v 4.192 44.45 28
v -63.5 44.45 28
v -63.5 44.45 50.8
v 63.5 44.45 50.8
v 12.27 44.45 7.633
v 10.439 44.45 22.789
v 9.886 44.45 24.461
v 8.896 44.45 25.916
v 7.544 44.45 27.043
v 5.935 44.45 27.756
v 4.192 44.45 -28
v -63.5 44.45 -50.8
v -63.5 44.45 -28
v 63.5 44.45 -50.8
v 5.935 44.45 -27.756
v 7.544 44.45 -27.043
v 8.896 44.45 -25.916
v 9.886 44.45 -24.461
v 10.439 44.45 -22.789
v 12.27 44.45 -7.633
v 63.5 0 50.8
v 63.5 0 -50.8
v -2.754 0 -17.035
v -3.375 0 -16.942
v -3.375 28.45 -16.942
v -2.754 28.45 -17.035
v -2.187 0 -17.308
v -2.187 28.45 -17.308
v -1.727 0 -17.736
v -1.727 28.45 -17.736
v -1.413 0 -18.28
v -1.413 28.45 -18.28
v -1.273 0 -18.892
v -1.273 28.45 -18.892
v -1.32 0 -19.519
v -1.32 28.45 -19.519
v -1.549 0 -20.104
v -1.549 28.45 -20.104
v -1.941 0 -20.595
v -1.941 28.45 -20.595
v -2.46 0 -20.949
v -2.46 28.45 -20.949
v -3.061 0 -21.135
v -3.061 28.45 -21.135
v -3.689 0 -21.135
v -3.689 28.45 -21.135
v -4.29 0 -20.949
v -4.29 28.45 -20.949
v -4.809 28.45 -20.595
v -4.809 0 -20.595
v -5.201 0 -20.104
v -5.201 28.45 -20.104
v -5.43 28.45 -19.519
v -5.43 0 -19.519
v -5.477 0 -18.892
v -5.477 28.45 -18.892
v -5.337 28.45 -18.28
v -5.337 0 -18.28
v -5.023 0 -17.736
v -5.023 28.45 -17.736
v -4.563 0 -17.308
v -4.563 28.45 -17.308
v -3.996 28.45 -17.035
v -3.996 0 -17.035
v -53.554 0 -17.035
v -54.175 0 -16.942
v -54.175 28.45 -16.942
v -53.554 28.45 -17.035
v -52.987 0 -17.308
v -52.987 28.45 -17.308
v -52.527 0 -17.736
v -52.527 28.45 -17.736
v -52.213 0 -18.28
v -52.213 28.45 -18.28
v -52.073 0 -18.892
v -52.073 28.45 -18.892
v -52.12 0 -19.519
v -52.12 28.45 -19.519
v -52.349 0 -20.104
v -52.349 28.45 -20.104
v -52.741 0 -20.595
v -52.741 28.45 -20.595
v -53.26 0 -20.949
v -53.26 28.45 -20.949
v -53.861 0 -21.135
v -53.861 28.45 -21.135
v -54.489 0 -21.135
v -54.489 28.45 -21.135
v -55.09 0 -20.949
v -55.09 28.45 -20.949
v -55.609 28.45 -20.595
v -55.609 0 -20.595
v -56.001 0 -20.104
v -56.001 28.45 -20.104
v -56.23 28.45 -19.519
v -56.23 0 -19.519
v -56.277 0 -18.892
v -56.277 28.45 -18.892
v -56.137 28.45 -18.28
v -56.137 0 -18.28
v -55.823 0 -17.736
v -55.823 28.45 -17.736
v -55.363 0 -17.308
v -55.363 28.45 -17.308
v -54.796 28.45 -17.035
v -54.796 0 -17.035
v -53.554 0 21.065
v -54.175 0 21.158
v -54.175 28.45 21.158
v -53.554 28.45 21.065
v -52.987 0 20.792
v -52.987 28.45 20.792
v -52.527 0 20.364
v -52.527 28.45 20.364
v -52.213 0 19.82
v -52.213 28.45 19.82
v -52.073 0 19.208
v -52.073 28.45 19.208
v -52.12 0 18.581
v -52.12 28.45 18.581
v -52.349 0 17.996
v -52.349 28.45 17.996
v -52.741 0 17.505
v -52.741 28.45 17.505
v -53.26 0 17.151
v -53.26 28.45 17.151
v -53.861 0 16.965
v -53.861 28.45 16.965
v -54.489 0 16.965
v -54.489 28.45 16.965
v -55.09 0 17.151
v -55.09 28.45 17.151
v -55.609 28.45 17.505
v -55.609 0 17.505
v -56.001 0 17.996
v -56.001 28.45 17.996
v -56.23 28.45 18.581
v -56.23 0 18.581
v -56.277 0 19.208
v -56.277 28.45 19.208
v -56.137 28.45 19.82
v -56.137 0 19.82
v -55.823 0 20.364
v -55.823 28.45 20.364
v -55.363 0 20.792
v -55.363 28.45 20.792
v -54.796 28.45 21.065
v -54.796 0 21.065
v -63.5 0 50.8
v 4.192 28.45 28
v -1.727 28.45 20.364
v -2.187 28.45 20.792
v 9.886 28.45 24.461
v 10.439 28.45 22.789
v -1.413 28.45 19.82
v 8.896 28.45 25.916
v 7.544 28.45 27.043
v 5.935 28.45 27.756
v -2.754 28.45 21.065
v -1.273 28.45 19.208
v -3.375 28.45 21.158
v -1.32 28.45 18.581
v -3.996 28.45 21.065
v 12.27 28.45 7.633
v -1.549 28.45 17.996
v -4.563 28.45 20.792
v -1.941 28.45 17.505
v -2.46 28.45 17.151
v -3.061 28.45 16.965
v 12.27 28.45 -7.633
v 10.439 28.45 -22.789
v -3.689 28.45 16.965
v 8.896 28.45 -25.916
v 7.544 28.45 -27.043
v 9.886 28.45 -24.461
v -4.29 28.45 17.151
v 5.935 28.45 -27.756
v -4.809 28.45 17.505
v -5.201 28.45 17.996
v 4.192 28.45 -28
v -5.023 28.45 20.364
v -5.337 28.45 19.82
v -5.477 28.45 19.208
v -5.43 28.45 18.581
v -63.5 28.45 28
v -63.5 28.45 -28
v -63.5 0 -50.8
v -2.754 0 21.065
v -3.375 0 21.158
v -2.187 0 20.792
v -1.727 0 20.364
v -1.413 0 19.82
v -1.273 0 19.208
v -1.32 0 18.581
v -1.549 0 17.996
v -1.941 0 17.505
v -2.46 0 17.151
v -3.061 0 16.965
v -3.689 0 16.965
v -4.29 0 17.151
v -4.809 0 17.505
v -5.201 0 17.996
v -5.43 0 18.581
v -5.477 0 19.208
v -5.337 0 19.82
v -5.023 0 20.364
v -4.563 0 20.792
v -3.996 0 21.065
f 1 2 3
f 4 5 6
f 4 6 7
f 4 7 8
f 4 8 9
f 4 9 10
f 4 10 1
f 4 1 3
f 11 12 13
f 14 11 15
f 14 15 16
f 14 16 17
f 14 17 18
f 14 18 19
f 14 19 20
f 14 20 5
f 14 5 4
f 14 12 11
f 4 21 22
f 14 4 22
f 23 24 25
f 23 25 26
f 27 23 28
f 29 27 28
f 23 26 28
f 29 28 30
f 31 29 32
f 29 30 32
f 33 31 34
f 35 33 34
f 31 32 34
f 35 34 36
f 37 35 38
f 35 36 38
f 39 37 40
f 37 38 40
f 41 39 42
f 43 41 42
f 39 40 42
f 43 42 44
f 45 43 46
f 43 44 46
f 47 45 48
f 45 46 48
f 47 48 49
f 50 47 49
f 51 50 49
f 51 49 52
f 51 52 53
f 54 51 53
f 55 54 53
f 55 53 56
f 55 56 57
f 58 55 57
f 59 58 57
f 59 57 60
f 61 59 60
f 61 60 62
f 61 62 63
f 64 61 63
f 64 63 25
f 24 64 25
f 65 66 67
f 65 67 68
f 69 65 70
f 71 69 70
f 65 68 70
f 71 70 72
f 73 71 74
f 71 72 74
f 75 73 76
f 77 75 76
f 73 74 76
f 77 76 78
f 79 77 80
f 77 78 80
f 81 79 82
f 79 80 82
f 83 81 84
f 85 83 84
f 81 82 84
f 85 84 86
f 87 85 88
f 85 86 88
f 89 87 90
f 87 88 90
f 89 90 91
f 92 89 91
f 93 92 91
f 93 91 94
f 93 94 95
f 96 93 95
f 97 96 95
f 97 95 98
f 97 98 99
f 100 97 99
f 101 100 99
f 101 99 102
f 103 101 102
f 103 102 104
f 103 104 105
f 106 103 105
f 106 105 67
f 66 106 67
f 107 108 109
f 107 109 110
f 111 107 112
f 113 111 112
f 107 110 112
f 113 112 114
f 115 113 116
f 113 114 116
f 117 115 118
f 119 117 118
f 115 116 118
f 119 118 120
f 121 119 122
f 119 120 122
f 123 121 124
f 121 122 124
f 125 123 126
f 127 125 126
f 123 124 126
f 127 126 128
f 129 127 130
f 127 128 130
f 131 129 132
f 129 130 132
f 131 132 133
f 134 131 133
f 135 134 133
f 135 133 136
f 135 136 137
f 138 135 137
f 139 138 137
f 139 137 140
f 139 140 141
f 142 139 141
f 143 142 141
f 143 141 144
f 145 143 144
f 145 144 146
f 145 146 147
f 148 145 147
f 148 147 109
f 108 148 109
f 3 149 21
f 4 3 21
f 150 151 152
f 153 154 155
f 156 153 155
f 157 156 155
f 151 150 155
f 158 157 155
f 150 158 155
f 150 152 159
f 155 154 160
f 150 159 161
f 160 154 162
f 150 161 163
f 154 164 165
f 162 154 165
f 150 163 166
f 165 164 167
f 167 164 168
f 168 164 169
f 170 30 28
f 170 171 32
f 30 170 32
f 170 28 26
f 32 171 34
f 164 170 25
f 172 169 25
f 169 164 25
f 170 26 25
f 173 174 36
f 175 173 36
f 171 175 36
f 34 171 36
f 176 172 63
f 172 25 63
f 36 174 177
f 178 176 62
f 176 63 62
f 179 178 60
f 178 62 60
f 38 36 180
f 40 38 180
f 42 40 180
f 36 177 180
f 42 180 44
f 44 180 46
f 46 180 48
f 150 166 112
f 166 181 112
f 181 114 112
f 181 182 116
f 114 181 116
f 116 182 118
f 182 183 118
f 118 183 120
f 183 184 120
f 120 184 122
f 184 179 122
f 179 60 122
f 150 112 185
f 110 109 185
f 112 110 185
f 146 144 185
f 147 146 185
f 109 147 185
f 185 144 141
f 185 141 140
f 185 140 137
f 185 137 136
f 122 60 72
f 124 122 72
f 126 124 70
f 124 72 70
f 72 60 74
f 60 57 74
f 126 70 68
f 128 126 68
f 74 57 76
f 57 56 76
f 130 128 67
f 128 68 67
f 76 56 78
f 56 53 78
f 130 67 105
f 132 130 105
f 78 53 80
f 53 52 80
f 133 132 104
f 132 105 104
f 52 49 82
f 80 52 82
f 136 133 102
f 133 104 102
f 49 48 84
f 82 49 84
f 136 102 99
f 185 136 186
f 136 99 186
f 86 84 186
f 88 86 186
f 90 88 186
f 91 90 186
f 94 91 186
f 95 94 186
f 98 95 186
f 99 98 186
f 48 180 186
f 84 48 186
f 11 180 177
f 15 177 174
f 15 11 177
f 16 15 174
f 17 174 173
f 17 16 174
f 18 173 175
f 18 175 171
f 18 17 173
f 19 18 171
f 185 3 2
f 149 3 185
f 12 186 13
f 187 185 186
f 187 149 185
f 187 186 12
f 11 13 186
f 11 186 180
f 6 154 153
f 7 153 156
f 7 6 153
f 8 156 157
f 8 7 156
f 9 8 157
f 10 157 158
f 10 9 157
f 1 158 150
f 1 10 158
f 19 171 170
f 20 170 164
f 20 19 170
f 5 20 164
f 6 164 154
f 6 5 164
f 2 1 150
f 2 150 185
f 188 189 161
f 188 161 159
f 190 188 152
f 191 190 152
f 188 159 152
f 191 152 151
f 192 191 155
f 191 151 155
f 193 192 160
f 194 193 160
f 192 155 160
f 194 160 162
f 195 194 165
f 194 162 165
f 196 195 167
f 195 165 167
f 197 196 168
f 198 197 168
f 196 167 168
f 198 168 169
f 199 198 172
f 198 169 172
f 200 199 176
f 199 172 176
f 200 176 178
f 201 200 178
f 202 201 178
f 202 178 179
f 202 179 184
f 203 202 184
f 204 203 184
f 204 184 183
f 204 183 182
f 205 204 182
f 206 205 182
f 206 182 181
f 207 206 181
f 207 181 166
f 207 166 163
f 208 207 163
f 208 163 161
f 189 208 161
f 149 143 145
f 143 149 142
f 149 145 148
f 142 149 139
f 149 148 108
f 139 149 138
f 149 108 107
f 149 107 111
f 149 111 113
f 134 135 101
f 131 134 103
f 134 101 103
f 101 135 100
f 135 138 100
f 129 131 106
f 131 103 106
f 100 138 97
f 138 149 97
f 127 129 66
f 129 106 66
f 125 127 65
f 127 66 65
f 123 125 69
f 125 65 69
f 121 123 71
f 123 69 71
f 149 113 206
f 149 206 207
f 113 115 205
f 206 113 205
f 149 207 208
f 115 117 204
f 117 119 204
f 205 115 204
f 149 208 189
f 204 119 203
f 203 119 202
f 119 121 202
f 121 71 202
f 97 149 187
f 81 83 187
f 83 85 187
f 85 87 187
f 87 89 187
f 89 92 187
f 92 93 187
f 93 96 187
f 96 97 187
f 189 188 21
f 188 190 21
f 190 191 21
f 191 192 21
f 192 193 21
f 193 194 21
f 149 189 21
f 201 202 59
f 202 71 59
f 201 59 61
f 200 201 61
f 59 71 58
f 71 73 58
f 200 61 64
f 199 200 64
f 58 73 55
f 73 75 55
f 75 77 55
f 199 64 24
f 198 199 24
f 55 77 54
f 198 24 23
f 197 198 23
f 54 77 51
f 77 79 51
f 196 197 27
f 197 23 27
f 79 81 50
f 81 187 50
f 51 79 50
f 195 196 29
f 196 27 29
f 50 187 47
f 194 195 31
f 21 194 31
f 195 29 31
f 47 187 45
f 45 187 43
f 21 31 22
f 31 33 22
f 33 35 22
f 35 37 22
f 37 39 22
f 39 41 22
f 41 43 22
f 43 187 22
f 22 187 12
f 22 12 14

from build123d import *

# Parameters (mm, degrees)
SKETCH1_W           = 127
SKETCH1_H           = 101.6
BOSS_EXTRUDE1_DEPTH = 44.45
CUT_EXTRUDE1_DEPTH  = 16
SKETCH3_R           = 2.1082
CUT_EXTRUDE2_DEPTH  = 87.152727757


with BuildPart() as part:
    # Sketch1 → Boss-Extrude1 (new body)
    with BuildSketch(Plane(origin=(0, 0, 0), x_dir=(1, 0, 0), z_dir=(0, 1, 0))):
        Rectangle(SKETCH1_W, SKETCH1_H)
    extrude(amount=BOSS_EXTRUDE1_DEPTH)

    # Sketch2 → Cut-Extrude1 (cut)
    with BuildSketch(Plane(origin=(0, 44.45, 0), x_dir=(1, 0, 0), z_dir=(0, 1, 0))):
        with BuildLine():
            Line((-63.5, 28), (4.191617227, 28))
            ThreePointArc((4.191617227, 28), (8.25897768, 26.526379697), (10.43854445, 22.789473684))
            ThreePointArc((10.43854445, 22.789473684), (12.5, 0), (10.43854445, -22.789473684))
            ThreePointArc((10.43854445, -22.789473684), (8.25897768, -26.526379697), (4.191617227, -28))
            Line((4.191617227, -28), (-63.5, -28))
            Line((-63.5, -28), (-63.5, 28))
        make_face()
    extrude(amount=-CUT_EXTRUDE1_DEPTH, mode=Mode.SUBTRACT)

    # Sketch3 → Cut-Extrude2 (cut, through all)
    with BuildSketch(Plane(origin=(0, 28.45, 0), x_dir=(1, 0, 0), z_dir=(0, 1, 0))):
        with Locations(Location((-54.175, 19.05, 0), (0, 0, 270))):
            Circle(SKETCH3_R)
        with Locations(Location((-54.175, -19.05, 0), (0, 0, 270))):
            Circle(SKETCH3_R)
        with Locations(Location((-3.375, 19.05, 0), (0, 0, 270))):
            Circle(SKETCH3_R)
        with Locations(Location((-3.375, -19.05, 0), (0, 0, 270))):
            Circle(SKETCH3_R)
    extrude(amount=-CUT_EXTRUDE2_DEPTH, mode=Mode.SUBTRACT)


solid = part.part
